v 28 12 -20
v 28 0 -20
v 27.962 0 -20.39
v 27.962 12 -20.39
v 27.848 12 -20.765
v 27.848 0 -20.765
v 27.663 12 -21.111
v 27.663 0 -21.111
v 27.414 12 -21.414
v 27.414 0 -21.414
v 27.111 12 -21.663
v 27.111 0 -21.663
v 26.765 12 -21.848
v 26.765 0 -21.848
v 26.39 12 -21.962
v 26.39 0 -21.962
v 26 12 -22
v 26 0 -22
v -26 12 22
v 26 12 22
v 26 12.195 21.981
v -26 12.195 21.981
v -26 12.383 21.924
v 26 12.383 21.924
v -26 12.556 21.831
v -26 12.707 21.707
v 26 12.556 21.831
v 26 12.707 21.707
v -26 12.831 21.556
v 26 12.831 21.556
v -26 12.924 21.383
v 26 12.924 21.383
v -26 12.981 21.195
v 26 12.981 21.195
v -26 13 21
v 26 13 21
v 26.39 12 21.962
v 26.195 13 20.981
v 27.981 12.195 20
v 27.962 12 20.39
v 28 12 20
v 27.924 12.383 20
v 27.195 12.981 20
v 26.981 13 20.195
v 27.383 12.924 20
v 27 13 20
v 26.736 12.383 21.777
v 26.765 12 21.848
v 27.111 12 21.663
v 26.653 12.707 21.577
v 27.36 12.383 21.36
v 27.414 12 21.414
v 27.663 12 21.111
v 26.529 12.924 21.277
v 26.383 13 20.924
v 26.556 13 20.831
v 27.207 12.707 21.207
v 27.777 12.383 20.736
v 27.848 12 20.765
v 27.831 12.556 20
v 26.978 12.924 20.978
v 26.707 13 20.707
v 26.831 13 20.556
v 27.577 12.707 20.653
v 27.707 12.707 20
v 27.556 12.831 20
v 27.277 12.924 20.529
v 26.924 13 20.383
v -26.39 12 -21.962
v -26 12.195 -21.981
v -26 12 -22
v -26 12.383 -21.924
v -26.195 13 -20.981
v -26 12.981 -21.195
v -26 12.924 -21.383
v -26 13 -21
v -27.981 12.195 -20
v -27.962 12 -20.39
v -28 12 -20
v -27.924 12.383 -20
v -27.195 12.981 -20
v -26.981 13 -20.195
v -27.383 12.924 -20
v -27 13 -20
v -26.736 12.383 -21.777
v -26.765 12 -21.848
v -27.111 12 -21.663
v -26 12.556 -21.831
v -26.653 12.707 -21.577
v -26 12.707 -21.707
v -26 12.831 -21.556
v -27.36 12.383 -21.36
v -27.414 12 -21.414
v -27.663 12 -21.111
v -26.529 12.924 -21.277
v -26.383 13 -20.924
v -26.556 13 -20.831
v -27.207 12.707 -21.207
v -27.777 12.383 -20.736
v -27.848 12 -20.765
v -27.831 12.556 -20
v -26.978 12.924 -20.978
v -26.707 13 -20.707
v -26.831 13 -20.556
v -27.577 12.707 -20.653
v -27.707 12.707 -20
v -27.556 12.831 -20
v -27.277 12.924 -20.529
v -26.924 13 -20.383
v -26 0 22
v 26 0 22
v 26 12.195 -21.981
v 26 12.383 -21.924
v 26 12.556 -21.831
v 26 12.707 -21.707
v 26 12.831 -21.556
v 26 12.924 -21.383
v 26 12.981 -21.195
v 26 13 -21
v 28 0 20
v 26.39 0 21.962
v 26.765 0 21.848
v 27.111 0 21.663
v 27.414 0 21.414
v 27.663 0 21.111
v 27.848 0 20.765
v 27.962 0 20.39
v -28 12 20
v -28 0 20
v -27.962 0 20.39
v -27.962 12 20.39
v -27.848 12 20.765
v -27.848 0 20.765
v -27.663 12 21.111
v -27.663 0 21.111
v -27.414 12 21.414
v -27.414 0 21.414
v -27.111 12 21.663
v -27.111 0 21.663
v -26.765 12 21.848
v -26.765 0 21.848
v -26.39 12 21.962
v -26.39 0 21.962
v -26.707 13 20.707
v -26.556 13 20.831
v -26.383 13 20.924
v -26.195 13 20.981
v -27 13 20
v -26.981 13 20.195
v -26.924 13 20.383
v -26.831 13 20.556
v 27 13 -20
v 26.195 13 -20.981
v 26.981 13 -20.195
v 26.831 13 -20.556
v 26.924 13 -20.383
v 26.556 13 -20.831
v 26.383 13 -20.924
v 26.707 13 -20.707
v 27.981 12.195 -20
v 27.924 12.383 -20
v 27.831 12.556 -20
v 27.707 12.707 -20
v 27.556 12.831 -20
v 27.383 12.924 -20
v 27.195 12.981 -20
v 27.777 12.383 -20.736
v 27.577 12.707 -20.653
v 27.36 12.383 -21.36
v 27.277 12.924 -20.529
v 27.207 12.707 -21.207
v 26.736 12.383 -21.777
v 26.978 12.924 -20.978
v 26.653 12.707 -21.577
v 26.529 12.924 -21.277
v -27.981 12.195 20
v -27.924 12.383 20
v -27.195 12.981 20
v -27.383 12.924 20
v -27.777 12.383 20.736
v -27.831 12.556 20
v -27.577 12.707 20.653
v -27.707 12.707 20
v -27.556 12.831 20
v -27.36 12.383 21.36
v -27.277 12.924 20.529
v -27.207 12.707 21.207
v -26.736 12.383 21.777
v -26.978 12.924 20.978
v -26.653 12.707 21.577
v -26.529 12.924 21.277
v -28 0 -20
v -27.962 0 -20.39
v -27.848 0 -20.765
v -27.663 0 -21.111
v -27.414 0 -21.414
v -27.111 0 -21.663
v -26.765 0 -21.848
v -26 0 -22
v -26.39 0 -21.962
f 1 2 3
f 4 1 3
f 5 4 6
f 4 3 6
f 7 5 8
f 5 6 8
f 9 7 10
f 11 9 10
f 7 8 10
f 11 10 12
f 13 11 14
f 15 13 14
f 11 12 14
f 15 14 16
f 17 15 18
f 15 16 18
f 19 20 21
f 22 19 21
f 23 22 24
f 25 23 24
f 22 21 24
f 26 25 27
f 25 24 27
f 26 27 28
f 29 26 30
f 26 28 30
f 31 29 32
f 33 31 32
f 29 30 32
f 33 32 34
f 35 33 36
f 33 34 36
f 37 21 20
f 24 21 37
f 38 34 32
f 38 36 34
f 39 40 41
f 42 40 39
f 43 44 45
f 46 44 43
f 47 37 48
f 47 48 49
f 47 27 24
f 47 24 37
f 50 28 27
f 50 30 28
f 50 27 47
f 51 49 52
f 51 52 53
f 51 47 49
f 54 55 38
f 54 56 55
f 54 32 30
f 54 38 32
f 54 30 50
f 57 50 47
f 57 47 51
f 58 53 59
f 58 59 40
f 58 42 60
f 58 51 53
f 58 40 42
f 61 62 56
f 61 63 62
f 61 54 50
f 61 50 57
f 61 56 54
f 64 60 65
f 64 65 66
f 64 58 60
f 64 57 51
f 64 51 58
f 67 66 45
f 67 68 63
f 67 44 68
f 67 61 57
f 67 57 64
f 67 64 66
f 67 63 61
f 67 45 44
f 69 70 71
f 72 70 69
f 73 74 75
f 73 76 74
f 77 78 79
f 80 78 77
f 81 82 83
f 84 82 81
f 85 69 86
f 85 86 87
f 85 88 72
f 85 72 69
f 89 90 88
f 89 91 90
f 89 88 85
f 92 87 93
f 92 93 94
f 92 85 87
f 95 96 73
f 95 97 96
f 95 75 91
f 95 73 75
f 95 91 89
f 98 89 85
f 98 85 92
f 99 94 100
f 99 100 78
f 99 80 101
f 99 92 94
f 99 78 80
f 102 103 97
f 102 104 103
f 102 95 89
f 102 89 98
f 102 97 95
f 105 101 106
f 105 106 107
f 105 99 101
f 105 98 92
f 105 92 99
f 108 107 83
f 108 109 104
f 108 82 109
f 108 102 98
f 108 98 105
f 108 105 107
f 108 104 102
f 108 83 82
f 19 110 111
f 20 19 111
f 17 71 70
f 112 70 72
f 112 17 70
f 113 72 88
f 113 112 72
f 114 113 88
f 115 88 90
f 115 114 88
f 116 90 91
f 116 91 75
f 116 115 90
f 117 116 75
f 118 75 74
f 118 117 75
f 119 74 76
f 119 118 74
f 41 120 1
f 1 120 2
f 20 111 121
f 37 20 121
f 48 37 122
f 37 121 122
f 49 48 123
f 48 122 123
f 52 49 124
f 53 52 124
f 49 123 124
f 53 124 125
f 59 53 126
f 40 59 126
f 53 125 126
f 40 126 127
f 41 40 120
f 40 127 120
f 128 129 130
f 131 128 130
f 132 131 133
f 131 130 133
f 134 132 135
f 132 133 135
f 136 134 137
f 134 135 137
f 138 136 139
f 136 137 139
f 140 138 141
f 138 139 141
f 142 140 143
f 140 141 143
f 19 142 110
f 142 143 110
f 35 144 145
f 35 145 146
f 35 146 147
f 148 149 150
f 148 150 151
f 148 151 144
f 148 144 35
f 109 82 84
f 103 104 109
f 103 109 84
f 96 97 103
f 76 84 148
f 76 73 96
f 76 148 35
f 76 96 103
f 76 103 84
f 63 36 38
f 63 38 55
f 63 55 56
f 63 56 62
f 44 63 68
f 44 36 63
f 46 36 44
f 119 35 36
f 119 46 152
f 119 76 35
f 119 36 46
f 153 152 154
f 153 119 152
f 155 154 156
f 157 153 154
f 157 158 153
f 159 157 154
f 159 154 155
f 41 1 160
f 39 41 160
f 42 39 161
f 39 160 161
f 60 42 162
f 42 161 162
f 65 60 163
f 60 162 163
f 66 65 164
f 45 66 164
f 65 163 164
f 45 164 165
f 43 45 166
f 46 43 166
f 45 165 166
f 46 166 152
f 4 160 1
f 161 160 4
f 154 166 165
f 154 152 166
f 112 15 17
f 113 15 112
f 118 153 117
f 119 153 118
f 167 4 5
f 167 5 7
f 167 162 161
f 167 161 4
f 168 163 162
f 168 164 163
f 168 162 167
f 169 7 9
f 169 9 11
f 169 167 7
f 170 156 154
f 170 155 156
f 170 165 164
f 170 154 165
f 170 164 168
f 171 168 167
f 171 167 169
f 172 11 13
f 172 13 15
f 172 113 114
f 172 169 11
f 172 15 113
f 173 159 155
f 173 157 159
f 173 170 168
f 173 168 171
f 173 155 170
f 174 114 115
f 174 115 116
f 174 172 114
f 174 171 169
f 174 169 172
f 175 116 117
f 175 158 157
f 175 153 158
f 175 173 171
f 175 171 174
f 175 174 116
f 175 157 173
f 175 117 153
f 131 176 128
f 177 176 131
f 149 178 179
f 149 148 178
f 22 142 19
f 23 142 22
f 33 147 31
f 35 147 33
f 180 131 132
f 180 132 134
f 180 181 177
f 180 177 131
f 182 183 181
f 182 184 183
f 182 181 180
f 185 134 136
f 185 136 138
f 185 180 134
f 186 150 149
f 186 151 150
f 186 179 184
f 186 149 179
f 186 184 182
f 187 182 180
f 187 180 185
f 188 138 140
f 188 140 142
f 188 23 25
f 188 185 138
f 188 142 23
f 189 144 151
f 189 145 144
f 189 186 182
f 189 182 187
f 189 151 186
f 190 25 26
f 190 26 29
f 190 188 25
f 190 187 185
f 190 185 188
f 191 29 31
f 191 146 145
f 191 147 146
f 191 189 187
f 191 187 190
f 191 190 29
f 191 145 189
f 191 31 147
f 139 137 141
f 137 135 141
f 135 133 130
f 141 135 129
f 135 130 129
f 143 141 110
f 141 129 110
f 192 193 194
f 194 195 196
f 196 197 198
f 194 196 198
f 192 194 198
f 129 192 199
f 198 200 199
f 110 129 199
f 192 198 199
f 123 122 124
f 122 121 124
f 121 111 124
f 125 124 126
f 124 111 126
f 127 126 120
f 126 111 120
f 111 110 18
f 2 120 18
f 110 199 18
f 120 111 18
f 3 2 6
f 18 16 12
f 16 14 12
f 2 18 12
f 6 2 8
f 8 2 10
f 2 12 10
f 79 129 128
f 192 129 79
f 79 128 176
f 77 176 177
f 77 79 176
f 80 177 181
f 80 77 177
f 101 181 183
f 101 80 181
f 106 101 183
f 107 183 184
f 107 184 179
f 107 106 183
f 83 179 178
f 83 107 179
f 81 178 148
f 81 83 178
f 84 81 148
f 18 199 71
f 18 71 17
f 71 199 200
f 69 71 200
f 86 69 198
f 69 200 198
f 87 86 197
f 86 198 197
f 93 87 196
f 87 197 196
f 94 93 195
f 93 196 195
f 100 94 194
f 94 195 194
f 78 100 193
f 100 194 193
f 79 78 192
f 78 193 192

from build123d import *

# Parameters (mm, degrees)
SKETCH1_W           = 56
SKETCH1_H           = 44
BOSS_EXTRUDE1_DEPTH = 13
FILLET1_R           = 1
FILLET2_R           = 2


with BuildPart() as part:
    # Sketch1 → Boss-Extrude1 (new body)
    with BuildSketch(Plane(origin=(0, 0, 0), x_dir=(1, 0, 0), z_dir=(0, 1, 0))):
        Rectangle(SKETCH1_W, SKETCH1_H)
    extrude(amount=BOSS_EXTRUDE1_DEPTH)

    # Fillet1
    fillet1_edges = [part.edges().sort_by_distance(p)[0] for p in [
        (28, 13, 0),
        (0, 13, -22),
        (-28, 13, 0),
        (0, 13, 22),
    ]]
    fillet(fillet1_edges, radius=FILLET1_R)

    # Fillet2
    # the kernel refuses this fillet: 2 mm, written as the material it takes off along each edge
    with BuildSketch(Plane(origin=(26, 13, 20), x_dir=(0, 0, 1), z_dir=(-1, 0, 0))) as fillet2_piece_1:
        with BuildLine():
            CenterArc((1, -1), 1, 0, 90)
            Line((2, -1), (2, 0))
            Line((2, 0), (1, 0))
        make_face()
    revolve(axis=Axis((26, 13, 20), (0, 1, 0)), revolution_arc=90, mode=Mode.SUBTRACT)
    with BuildSketch(Plane(origin=(-26, 13, 20), x_dir=(-1, 0, 0), z_dir=(0, 0, -1))) as fillet2_piece_2:
        with BuildLine():
            CenterArc((1, -1), 1, 0, 90)
            Line((2, -1), (2, 0))
            Line((2, 0), (1, 0))
        make_face()
    revolve(axis=Axis((-26, 13, 20), (0, 1, 0)), revolution_arc=90, mode=Mode.SUBTRACT)
    with BuildSketch(Plane(origin=(26, 13, -20), x_dir=(1, 0, 0), z_dir=(0, 0, 1))) as fillet2_piece_3:
        with BuildLine():
            CenterArc((1, -1), 1, 0, 90)
            Line((2, -1), (2, 0))
            Line((2, 0), (1, 0))
        make_face()
    revolve(axis=Axis((26, 13, -20), (0, 1, 0)), revolution_arc=90, mode=Mode.SUBTRACT)
    with BuildSketch(Plane(origin=(-26, 13, -20), x_dir=(0, 0, -1), z_dir=(1, 0, 0))) as fillet2_piece_4:
        with BuildLine():
            CenterArc((1, -1), 1, 0, 90)
            Line((2, -1), (2, 0))
            Line((2, 0), (1, 0))
        make_face()
    revolve(axis=Axis((-26, 13, -20), (0, 1, 0)), revolution_arc=90, mode=Mode.SUBTRACT)
    with BuildSketch(Plane(origin=(-28, -5, -22), x_dir=(1, 0, 0), z_dir=(0, 1, 0)), Plane(origin=(-28, -5, 22), x_dir=(0, 0, -1), z_dir=(0, 1, 0))) as fillet2_piece_5:
        with BuildLine():
            CenterArc((FILLET2_R, -FILLET2_R), FILLET2_R, 90, 90)
            Line((0, -FILLET2_R), (0, 0))
            Line((0, 0), (FILLET2_R, 0))
        make_face()
    extrude(amount=18, mode=Mode.SUBTRACT)
    with BuildSketch(Plane(origin=(28, -5, -22), x_dir=(-1, 0, 0), z_dir=(0, 1, 0)), Plane(origin=(28, -5, 22), x_dir=(0, 0, -1), z_dir=(0, 1, 0))) as fillet2_piece_6:
        with BuildLine():
            CenterArc((FILLET2_R, FILLET2_R), FILLET2_R, 180, 90)
            Line((0, FILLET2_R), (0, 0))
            Line((0, 0), (FILLET2_R, 0))
        make_face()
    extrude(amount=18, mode=Mode.SUBTRACT)


solid = part.part
